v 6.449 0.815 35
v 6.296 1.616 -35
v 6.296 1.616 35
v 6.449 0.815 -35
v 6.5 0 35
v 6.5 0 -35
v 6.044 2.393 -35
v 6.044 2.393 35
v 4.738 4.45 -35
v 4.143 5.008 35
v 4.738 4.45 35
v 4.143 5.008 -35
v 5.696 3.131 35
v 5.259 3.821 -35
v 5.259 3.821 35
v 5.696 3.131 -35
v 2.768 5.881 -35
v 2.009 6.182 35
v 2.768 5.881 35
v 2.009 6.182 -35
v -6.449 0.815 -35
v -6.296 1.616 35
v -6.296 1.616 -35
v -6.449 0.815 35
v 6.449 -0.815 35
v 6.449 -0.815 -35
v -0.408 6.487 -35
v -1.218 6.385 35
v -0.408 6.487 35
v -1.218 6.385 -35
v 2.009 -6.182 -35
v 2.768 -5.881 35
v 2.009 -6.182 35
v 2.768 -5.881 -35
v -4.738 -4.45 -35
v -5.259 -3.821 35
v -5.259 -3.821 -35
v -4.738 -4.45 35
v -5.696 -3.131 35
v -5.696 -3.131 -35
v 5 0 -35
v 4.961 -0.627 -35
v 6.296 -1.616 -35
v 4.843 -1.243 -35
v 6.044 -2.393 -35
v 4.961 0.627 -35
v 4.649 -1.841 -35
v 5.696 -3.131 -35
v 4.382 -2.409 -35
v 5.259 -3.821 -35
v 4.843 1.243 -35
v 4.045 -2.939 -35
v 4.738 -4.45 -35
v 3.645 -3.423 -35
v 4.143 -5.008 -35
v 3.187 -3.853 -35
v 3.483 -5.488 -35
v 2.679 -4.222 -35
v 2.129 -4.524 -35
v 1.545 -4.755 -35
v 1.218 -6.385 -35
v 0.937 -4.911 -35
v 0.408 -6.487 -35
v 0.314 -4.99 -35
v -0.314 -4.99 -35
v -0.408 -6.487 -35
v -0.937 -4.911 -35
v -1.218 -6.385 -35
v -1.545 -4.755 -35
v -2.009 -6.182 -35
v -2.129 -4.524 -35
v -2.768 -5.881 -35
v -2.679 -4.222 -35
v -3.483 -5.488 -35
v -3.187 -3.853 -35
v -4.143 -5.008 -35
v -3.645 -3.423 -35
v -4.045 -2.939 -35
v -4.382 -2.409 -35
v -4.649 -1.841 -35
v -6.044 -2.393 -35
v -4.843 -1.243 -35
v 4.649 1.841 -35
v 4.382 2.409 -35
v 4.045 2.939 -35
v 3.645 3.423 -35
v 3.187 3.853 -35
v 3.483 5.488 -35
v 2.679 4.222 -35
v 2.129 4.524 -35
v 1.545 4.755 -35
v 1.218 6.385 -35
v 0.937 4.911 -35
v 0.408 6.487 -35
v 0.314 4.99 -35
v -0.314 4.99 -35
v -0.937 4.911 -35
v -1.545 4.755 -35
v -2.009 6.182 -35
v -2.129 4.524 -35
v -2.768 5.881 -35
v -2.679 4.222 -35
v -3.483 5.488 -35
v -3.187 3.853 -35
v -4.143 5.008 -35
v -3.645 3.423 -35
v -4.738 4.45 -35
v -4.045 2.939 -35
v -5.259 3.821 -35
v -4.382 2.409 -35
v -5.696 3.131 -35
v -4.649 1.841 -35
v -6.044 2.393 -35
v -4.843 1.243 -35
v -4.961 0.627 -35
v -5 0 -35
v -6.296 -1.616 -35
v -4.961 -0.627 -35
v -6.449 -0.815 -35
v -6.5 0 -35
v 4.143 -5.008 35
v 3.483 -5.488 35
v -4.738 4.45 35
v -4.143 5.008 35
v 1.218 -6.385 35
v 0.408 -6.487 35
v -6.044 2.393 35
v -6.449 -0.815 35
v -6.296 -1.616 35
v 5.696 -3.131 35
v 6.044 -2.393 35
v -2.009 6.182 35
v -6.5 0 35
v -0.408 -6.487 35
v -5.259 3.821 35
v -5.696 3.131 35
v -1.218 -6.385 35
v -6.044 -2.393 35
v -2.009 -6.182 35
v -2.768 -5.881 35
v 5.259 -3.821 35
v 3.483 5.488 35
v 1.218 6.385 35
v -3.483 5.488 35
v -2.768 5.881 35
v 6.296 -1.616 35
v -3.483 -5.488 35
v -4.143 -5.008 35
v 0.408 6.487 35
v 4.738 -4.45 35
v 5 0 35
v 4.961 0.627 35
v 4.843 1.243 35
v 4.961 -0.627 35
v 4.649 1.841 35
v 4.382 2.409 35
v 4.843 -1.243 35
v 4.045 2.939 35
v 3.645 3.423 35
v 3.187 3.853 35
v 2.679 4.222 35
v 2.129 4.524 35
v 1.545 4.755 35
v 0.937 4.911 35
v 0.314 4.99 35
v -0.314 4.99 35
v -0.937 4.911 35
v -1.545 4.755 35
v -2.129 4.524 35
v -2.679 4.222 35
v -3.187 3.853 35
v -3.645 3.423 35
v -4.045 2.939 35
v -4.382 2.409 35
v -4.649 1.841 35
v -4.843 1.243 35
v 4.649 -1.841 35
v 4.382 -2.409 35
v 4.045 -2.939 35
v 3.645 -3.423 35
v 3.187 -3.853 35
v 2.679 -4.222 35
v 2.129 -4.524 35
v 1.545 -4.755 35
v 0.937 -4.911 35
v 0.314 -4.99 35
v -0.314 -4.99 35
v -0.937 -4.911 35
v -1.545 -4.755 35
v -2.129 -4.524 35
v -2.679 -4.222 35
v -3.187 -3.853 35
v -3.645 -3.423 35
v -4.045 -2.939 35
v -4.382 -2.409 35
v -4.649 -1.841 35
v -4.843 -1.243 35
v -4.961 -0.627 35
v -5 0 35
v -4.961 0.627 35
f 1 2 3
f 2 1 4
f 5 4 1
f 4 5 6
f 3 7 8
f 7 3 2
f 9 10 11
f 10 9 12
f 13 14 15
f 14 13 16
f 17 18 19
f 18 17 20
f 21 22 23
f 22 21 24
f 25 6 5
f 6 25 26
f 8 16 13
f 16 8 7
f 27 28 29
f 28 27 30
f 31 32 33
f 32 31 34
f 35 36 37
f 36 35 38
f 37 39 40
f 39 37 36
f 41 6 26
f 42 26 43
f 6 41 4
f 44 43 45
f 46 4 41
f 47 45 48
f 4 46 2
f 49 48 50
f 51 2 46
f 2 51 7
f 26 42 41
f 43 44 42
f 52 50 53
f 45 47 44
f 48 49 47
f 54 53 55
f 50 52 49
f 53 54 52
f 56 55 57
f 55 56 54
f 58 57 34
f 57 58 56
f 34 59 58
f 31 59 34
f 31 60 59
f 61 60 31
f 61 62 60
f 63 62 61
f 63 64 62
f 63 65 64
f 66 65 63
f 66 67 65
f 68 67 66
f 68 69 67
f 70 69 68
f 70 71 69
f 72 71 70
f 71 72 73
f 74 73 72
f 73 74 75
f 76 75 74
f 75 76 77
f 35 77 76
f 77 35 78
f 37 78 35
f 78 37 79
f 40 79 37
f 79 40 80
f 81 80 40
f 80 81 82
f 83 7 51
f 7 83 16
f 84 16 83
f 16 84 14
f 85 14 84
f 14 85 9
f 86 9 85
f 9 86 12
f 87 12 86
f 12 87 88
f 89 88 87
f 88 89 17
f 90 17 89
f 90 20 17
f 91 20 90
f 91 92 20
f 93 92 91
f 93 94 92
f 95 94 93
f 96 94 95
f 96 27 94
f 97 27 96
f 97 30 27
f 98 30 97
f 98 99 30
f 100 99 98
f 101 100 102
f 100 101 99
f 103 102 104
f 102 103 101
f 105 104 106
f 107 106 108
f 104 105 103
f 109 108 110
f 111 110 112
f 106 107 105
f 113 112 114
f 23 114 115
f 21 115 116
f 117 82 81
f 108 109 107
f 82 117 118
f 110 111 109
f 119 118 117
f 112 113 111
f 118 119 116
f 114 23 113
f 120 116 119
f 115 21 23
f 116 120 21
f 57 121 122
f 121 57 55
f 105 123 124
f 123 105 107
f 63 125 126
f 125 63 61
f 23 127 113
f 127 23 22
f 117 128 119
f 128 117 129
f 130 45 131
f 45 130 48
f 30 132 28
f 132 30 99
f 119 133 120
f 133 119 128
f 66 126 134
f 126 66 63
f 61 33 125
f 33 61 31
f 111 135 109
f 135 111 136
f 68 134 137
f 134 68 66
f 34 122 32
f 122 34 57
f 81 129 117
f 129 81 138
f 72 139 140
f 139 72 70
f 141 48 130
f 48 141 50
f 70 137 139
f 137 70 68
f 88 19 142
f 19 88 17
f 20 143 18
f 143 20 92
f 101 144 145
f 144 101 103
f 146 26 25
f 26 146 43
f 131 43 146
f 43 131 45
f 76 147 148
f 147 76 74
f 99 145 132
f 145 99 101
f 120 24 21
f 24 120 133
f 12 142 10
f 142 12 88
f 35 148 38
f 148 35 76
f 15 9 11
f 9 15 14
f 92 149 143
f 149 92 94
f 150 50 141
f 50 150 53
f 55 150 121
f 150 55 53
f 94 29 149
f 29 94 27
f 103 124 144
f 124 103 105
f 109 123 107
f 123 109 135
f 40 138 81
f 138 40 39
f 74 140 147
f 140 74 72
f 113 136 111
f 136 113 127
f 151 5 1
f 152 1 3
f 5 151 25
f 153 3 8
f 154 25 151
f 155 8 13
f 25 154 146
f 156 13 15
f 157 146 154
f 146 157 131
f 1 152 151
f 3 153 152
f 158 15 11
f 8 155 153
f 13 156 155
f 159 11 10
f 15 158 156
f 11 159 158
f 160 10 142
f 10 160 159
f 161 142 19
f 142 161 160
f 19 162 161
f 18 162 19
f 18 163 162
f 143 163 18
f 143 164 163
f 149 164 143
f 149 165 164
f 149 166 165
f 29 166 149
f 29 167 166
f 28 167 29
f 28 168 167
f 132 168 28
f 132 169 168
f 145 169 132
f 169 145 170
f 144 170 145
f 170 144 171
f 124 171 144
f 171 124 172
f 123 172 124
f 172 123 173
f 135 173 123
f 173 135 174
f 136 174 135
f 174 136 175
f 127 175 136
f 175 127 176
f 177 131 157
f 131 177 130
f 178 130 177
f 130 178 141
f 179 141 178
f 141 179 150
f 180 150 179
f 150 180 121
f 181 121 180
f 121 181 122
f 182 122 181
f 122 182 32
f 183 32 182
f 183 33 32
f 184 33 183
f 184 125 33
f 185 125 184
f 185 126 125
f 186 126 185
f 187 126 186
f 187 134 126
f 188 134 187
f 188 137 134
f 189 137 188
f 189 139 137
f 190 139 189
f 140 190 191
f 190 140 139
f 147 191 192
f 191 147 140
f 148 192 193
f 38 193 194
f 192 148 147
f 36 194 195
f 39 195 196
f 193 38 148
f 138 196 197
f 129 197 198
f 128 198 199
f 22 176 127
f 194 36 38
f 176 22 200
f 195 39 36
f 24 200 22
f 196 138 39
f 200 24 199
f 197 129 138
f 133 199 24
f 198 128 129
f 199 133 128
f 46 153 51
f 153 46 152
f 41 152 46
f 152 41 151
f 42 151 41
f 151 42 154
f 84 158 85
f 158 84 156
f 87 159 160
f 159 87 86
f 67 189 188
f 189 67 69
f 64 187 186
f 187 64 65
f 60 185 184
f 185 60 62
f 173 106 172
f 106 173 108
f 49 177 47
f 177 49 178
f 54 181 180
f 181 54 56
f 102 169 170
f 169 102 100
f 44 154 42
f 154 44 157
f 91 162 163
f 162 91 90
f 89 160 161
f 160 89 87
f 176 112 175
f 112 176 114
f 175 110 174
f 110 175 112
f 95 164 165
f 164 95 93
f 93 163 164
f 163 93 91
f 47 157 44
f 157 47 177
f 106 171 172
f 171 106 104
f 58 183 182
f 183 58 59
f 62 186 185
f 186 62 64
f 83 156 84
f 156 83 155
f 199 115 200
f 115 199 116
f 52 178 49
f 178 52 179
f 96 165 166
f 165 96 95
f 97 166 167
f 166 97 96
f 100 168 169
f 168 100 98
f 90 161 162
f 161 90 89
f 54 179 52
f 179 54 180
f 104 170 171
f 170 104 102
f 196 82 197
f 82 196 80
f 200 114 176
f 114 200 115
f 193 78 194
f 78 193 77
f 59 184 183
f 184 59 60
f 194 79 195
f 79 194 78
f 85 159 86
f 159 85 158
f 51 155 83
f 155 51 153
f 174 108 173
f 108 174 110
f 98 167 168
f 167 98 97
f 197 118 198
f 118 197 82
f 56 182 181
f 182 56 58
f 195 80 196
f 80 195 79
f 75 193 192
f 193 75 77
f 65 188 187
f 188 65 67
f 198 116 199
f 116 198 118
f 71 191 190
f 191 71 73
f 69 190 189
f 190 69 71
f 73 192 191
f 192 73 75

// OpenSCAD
$fn = 50;


difference() {
	union() {
		translate(v = [0, 0, -35.0000000000]) {
			cylinder(h = 70, r = 6.5000000000);
		}
	}
	union() {
		translate(v = [0, 0, -100.0000000000]) {
			cylinder(h = 200, r = 5.0000000000);
		}
	}
}
